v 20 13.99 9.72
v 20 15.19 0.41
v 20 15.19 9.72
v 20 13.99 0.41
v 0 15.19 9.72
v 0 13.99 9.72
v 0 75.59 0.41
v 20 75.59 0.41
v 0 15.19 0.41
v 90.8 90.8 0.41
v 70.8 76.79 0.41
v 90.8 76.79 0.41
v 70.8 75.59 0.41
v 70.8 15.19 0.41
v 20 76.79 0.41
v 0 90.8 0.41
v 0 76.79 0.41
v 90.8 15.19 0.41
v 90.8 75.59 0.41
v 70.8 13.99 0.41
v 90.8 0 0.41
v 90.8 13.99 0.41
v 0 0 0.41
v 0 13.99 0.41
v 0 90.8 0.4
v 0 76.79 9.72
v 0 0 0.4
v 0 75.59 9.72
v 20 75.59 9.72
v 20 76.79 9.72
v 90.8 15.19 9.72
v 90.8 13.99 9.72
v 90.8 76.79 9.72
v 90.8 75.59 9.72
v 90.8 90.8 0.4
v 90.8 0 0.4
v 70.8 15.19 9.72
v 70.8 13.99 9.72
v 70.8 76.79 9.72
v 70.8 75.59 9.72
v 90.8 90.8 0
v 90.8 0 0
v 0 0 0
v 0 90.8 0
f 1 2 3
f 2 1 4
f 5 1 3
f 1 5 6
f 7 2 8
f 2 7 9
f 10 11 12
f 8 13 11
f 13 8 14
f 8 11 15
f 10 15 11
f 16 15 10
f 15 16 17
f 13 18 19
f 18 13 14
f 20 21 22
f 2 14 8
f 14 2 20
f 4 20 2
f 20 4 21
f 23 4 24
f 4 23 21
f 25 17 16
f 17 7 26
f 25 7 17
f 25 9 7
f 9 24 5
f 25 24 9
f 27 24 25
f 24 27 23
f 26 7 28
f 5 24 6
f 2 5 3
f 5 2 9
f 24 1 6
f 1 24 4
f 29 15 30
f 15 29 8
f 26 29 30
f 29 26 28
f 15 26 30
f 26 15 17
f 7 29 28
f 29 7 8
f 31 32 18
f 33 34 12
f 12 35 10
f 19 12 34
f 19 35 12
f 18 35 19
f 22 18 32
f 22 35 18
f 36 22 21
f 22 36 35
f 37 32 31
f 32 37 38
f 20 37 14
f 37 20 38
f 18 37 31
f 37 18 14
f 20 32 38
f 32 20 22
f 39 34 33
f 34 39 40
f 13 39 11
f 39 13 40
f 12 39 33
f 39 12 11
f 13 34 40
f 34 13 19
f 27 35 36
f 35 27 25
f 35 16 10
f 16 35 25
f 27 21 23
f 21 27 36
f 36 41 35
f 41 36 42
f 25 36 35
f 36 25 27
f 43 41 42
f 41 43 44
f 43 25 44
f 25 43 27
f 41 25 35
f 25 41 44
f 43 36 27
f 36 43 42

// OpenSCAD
// file: ../../Base/Rotation.scad
// Fischertechnik Box Foundation
// Geometry Helpers Rotation

include <PlacementOptions.scad>

// getRotatedSpace(space, rotation=NoRotation)
// Rotates the space dependent on the specified rotation

function getRotatedSpace(space, rotation=NoRotation) = [
    (rotation == Rotate90 || rotation == Rotate270) ? space.y : space.x,
    (rotation == Rotate90 || rotation == Rotate270) ? space.x : space.y
];

// Rotates the given space around the fixed left lower corner
// space = the space the children needs as width/depth list [width,depth]
// rotation = 0 Rotate0 degrees, 1 Rotate90 degrees, 2 Rotate180 degrees, 3 Rotate270 degrees (equivalent to -90)

module RotateFix(space, rotation=NoRotation) {
    dy = (rotation == Rotate0 || rotation == Rotate270) ? 0 :
        (rotation == Rotate90) ? space.x :
        space.y;
    dx = (rotation < Rotate180) ? 0 :
        (rotation == Rotate180) ? space.x :
        space.y;
    
    translate([dx, dy, 0])
        rotate([0, 0, rotations[rotation]])
            children();
}
// file: ../../Base/Alignment.scad
// Fischertechnik Box Foundation
// Geometry Helpers Alignment

include <PlacementOptions.scad>

// getAlignedX(elementWidth, spaceWidth, align=AlignRight, offset=0)
// Gets the aligned X offset of an element with the given
// width in the given space.
// elementWidth = The width of the element to positon
// spaceWidth = The space where the element should be aligned
// align = 0 AlignLeft, 1 AlignCenter, 2 AlignRight
// offset = an optional offset from the aligned position. When
// aligned left or centered, then positive values are in X direction.
// When aligned right then positive values are in negative X direction.

function getAlignedX(elementWidth, spaceWidth, align=AlignRight, offset=0) =
    (align == AlignLeft) ?
        offset :
        ((align == AlignCenter) ?
        (spaceWidth - elementWidth)/2 + offset :
        spaceWidth - offset - elementWidth);

// getAlignedY(elementDepth, spaceDepth, align=AlignTop, offset=0)
// Gets the aligned Y offset of an element with the given
// depth in the given space.
// elementDepth = The depth of the element to positon
// spaceDepth = The space where the element should be aligned
// align = 0 AlignBottom, 1 AlignCenter, 2 AlignTop
// offset = an optional offset from the aligned position. When
// aligned bottom or centered, then positive values are in Y direction.
// When aligned top then positive values are in negative Y direction.

function getAlignedY(elementDepth, spaceDepth, align=AlignTop, offset=0) =
    (align == AlignBottom) ?
        offset :
        ((align == AlignCenter) ?
        (spaceDepth - elementDepth)/2 + offset :
        spaceDepth - offset - elementDepth);
// file: ../../Base/Boxes.scad
// Fischertechnik Box Foundation
// Pre-designed Boxes

use <Constants.scad>

include <PlacementOptions.scad>

box190Width = 190;
box190Depth = 130;
box130Width = 130;
box130Depth = 95;

// Values are from an original ec3 box
topBottomDifference = 1.5;
outerHeight = 40;
innerHeight = 38.2;
baseThickness = outerHeight - innerHeight;
stackExcess = 5.7;
radius = 3.5;
wallThickness = 1.5;
tolerance = 0.2;
stackOffset = innerHeight - stackExcess;

boxUsageHeight = stackOffset;
boxWallThickness = wallThickness;
boxBaseThickness = baseThickness;
boxWebWidth = 3.0;

// getBoxWallThickness()
// Gets the wall thickness of a Fischertechnik Box
function getBoxWallThickness() = boxWallThickness;

// getBoxUsageHeight()
// Gets the usable height of a Fischertechnik box
function getBoxUsageHeight() = boxUsageHeight;

// getBoxInnerHeight()
// Gets the inner height of a Fischertechnik box, including the stack excess
function getBoxInnerHeight() = innerHeight;

// getBoxBaseThickness()
// Gets the thickness of the Fischertechnik box base.
function getBoxBaseThickness() = boxBaseThickness;

// getBoxWebWidth()
// Gets the width of a box web
function getBoxWebWidth() = boxWebWidth;

// getBox190Space()
// Gets the usable inner space of a Box 190 as an x/y-list
function getBox190Space() = [
    box190Width - 2*getBoxWallThickness() - topBottomDifference, 
    box190Depth - 2*getBoxWallThickness() - topBottomDifference ];

// BoxBase(width, depth)
// Creates an empty stackable Fischertechnik compatible box
// width = Outer width of the box (190, 130, ...)
// depth = Outer depth of the box (130, 95, ...)

module BoxBase(width, depth, height=outerHeight) {    
    thinPlate = 0.01;

    innerHeight = height - baseThickness;    
    
    module BodyPlate(width, depth) {
        translate([radius, radius])
        hull() {
            w = width-2*radius;
            d = depth-2*radius;
            cube([w, d, thinPlate]);
            cylinder(thinPlate, r=radius, $fn=getFragments());
            translate([w, 0])
                cylinder(thinPlate, r=radius, $fn=getFragments());
            translate([w, d])
                cylinder(thinPlate, r=radius, $fn=getFragments());
            translate([0, d])
                cylinder(thinPlate, r=radius, $fn=getFragments());
        }
    }
    
    module Body(tolerance=tolerance) {
        hull() {
            // Bottom with tolerance to fit into the original boxes when stacked
            translate([-wallThickness+tolerance, -wallThickness+tolerance, -baseThickness])
                BodyPlate(width-topBottomDifference-2*tolerance, depth-topBottomDifference-2*tolerance);
            
            // Top
            translate([-wallThickness-topBottomDifference/2, -wallThickness-topBottomDifference/2, innerHeight-thinPlate])
                BodyPlate(width, depth);
         }
    }

    module Cutoff() {
        hull() {
            coWidth = width - 2*wallThickness;
            coDepth = depth - 2*wallThickness;
            
            // Bottom
            BodyPlate(coWidth-topBottomDifference, coDepth-topBottomDifference);

            // Top
            translate([-topBottomDifference/2, -topBottomDifference/2, innerHeight+thinPlate]) 
                BodyPlate(coWidth, coDepth);
        }
    }
    
    difference() {        
        Body();
        Cutoff();
        stackOffset = innerHeight - stackExcess;
        translate([0, 0, stackOffset + baseThickness])
            Body(tolerance=0);
    }
}

// Creates the Fischertechnik empty box 130x190 mm and places it at position 0,0
// 190x130 are the outer sizes, the inner space is slightly smaller. Use getBox190Space() to get the inner sizes.
// The box is positioned that the usable inner space is at the 0,0,0 position. The

module Box190() {
    BoxBase(box190Width, box190Depth);
}

// Gets the usable inner space of a Box 130 as an x/y-list
function getBox130Space() = [
    box130Width - 2*getBoxWallThickness() - topBottomDifference, 
    box130Depth - 2*getBoxWallThickness() - topBottomDifference ];

// Creates the Fischertechnik empty box 95x130 mm and places it at position 0,0
// 190x130 are the outer sizes, the inner space is slightly smaller. Use getBox190Space() to get the inner sizes.
// The box is positioned that the usable inner space is at the 0,0,0 position. The

module Box130() {
    BoxBase(box130Width, box130Depth);
}

// Creates a web at the specified box walls
// corner 0 = LowerLeft, 1 = UpperLeft, 2 = UpperRight, 3 = LowerRight
// side 0 = LeftOfCorner, 1 = RightOfCorner
// distance = Distance in mm from the corner
// boxSpace = inner width and depth of the box (default: Box 190)
// webWidth = length of the web (default is 3 mms)
// webThickness = thickness of the web (default is 1 mm)

module BoxWeb(corner, side, distance, boxSpace=getBox190Space(), webWidth=getBoxWebWidth(), webThickness=1.0) {
    sink = getBoxWallThickness()/2;

    width = (corner % 2 == 0) ? 
            (side == LeftOfCorner ? webWidth : webThickness) :
            (side == LeftOfCorner ? webThickness : webWidth);

    depth = (corner % 2 == 0) ? 
            (side == RightOfCorner ? webWidth : webThickness) :
            (side == RightOfCorner ? webThickness : webWidth);
    
    xDiff = corner == LowerLeft ? 
                (side == LeftOfCorner ? -sink : distance) :
            (corner == UpperLeft ?                
                (side == LeftOfCorner ? distance : -sink) :
            (corner == UpperRight ?
                (side == LeftOfCorner ? boxSpace.x-webWidth+sink : boxSpace.x-distance-webThickness) :
                (side == LeftOfCorner ? boxSpace.x-distance-webThickness: boxSpace.x-webWidth+sink)));

    yDiff = corner == LowerLeft ? 
                (side == RightOfCorner ? -sink : distance) :
            (corner == UpperLeft ?
                (side == RightOfCorner ? boxSpace.y-distance : boxSpace.y-webWidth+sink) :
            (corner == UpperRight ?
                (side == RightOfCorner ? boxSpace.y-webWidth+sink : boxSpace.y-distance) :
                (side == RightOfCorner ? distance : -sink)));
    
    translate([xDiff, yDiff, -getExcess()])
        cube([width, depth, boxUsageHeight + 2*getExcess()]);
}
// file: ../../Base/PlacementOptions.scad
// Fischertechnik Box Foundation
// Placement Options

// Alignment
NoAlign = 0;
AlignLeft = 1;
AlignBottom = 2;
AlignCenter = 3;
AlignRight = 4;
AlignTop = 5;

// Element rotation degree steps
rotations = [0, -90, -180, -270];

// Rotation
NoRotation = 0;
Rotate0 = 0;
Rotate90 = 1;
Rotate180 = 2;
Rotate270 = 3;

// Docking (seen from above)
NoDock = -1;
DockLeft = 0;
DockTop = 1;
DockRight = 2;
DockCorner = 2;
DockBottom = 3;

// Web corners
LowerLeft = 0;
UpperLeft = 1;
UpperRight = 2;
LowerRight = 3;

// Web position relative to corner
LeftOfCorner = 0;
RightOfCorner = 1;
// file: ../../Base/Placement.scad
// Fischertechnik Box Foundation
// Geometry Helpers Placement

use <Constants.scad>
use <Alignment.scad>
use <Rotation.scad>
use <Boxes.scad>

include <PlacementOptions.scad>

// Place(x=0, y=0, elementSpace=[0,0], alignX=AlignLeft, alignY=AlignBottom, rotation=Rotate0, boxSpace=getBox190Space())
// Places the child at the specified position
// y = Y-Position. This is a relative position when an X aligment is specified.
// x = X-Position. This is a relative position when an Y aligment is specified.
// elementSpace = space of the element to be placed [x,y]
// alignX = -1=NoAlign, 0 AlignLeft, 1 AlignCenter, 3 AlignRight (elementSpace and boxSpace required!)
// alignY = -1=NoAlign, 2 AlignBottom, 1 AlignCenter, 4 AlignTop (elementSpace and boxSpace required!)
// rotation = 0 Rotate0 0 degrees, 1 Rotate90 90 degrees, 
// 2 Rotate180 180 degrees, 3 Rotate270 270 degrees (equivalent to -90)
// boxSpace = Inner space of the box where the placement occurs [x,y] - default is Box 190x130 inner space

module Place(x=0, y=0, elementSpace=[0,0], 
  alignX=AlignLeft, alignY=AlignBottom, 
  rotation=NoRotation, boxSpace=getBox190Space()) {

    module Position(x, y, space, rotation=Rotate0) {
        translate([x, y, 0])
            RotateFix(space, rotation)
                children();
    }

    space = getRotatedSpace(elementSpace, rotation);
    alignedX = getAlignedX(space.x, boxSpace.x, alignX, x);
    alignedY = getAlignedY(space.y, boxSpace.y, alignY, y);
    Position(alignedX, alignedY, elementSpace, rotation)
        children();
}

// Center(space=getBox130Space(), elementSpace=[0,0])
// space = Space where the children is centered. For cylinder use centered=true and no elementSpace.
// elementSpace = space of the element to be centered [x,y]

module Center(space=getBox190Space(), elementSpace=[0,0]) {
    Place(elementSpace=elementSpace, boxSpace=space, alignX=AlignCenter, alignY=AlignCenter)
        children();
}

// CenterHorizontal(width=0, y=0, offset=0, space=getBox130Space())
// width = Width of the element to be placed.
// y = Y position of the element
// offset = Offset from the center position (negative will be left of the center)
// space = Space where the element is placed

module CenterHorizontal(width=0, y=0, offset=0, space=getBox190Space()) {
    Place(x=offset, y=y, elementSpace=[width, 0], boxSpace=space, alignX=AlignCenter)
        children(0);
}

// CenterVertical(depth=0, x=0, offset=0, space=getBox130Space())
// depth = Depth of the element to be placed.
// x = X position of the element
// offset = Offset from the center position (negative will be down of the center)
// space = Space where the element is placed

module CenterVertical(depth=0, x=0, offset=0, space=getBox190Space()) {
    Place(x=x, y=offset, elementSpace=[0, depth], boxSpace=space, alignY=AlignCenter)
        children(0);
}

// getIsVertical(align)
// True if the specified alignment needs a vertical orientation for a divider (AlignRight, AlignLeft)

function getIsVertical(align) = (align == AlignRight || align == AlignLeft);

// getIsHorizontal(align)
// True if the specified alignment needs a horizontal orientation for a divider (AlignTop, AlignBottom)

function getIsHorizontal(align) = (align == AlignTop || align == AlignBottom);
// file: ../../Elements/AxisClip10.scad
// Fischertechnik Box Library
// Axis for clip 10
// 31023

use <../ModelBase/Simple.scad>
use <../Base/Constants.scad>

width = 12;
depth = 12;
height = 23;
upperDiameter = 3.6;
clipHeight = 10;

// getAxisClip10Space()
// Gets the space of a frame for a clip 10 with spring ring (mot2)

function getAxisClip10Space() = [width, depth, height];

// AxisClip10(height, clipHeight)
// Axis for clip 10 with spring ring (mot2)
// height = Height of the complete axis
// clipHeight = Height of the rt for the clip (standard is 10, in mot3 its only 7)

module AxisClip10(height=height, clipHeight=clipHeight) {
    LeveledAxisWithSpace(height, height-clipHeight, getAxisClip10Space(), diameter=upperDiameter);
}

// Tests
color("lightgray")
AxisClip10();
// file: ../../Base/Constants.scad
// Fischertechnik Box Foundation
// Constants

// Constant values necessary for multiple elements

// Base constants
dividerThickness = 1.2;
excess = 0.01;
fragments = 90;
tolerance = 0.8;

// Gets the thickness of a divider 
function getDividerThickness() = dividerThickness;

// Gets the excess that is used to merge walls into each other
function getExcess() = excess;

// Gets amount of fragments of a cylinder
function getFragments() = fragments;

// Gets the inner tolerance of a frame to each side
function getTolerance() = tolerance;


// Fischertechnik specific constants
axisDiameter = 4;
axisBottomDiameter = axisDiameter + 1;
standardEdgeDistance = 2.5;
standardWebDistance = 11.5;
standardCornerLength = 15;
tubeWallFactor = 0.8;
smallPartsFrameHeight = 20;

// Gets axis diameter
function getAxisDiameter() = axisDiameter;

// Gets axis bottom diameter for thicker part at the bottom
function getAxisBottomDiameter() = axisBottomDiameter;

// gets the standard distance to the wall of the box for dockable frames with webs
function getStandardEdgeDistance() = standardEdgeDistance;

// gets the standard distance of each web to the corner of the dockable frame
function getStandardWebDistance() = standardWebDistance;

// gets the standard length of the corner walls of a dockable frame
function getStandardCornerLength() = standardCornerLength;

// gets the wall thickness of a tube.
function getTubeWallThickness() = tubeWallFactor * getDividerThickness();

// gets the frame height for docked small parts boxes.
function getSmallPartsFrameHeight() = smallPartsFrameHeight;
// file: ../../Elements/RailsBasePlate90x90.scad
// Fischertechnik Box Library
// Base Plate 90 x 90
// 31002

use <../ModelBase/Complex.scad>

width = 90;
depth = 90;

// getRailsBasePlate90x90Space()
// Gets the width and depth of the space the rails base for the base plate 90x90 needs.
function getRailsBasePlate90x90Space() = getRailsBasePlateVolume(width, depth);

// RailsBasePlate90x90()
// Rails for a base plate of 180 x 90 mm
// 31002

module RailsBasePlate90x90() {
    RailsBasePlate(width, depth);
}

// Test
color("lightgray")
RailsBasePlate90x90();
// file: ../TestPrint.scad
// 3D Print Test Base

use <../Base/Constants.scad>

use <../Elements/AxisClip10.scad>

module TestPrint(elementSpace) {
    cube([elementSpace.x, elementSpace.y, 0.4]);
    translate([0,0,0.4+getExcess()]) {
        children();
    }
}

TestPrint(getAxisClip10Space())
    AxisClip10();
// main file
// 3D Print Test
// RailsBasePlate90x90

use <../TestPrint.scad>
use <../../Elements/RailsBasePlate90x90.scad>

TestPrint(getRailsBasePlate90x90Space())
    RailsBasePlate90x90();
